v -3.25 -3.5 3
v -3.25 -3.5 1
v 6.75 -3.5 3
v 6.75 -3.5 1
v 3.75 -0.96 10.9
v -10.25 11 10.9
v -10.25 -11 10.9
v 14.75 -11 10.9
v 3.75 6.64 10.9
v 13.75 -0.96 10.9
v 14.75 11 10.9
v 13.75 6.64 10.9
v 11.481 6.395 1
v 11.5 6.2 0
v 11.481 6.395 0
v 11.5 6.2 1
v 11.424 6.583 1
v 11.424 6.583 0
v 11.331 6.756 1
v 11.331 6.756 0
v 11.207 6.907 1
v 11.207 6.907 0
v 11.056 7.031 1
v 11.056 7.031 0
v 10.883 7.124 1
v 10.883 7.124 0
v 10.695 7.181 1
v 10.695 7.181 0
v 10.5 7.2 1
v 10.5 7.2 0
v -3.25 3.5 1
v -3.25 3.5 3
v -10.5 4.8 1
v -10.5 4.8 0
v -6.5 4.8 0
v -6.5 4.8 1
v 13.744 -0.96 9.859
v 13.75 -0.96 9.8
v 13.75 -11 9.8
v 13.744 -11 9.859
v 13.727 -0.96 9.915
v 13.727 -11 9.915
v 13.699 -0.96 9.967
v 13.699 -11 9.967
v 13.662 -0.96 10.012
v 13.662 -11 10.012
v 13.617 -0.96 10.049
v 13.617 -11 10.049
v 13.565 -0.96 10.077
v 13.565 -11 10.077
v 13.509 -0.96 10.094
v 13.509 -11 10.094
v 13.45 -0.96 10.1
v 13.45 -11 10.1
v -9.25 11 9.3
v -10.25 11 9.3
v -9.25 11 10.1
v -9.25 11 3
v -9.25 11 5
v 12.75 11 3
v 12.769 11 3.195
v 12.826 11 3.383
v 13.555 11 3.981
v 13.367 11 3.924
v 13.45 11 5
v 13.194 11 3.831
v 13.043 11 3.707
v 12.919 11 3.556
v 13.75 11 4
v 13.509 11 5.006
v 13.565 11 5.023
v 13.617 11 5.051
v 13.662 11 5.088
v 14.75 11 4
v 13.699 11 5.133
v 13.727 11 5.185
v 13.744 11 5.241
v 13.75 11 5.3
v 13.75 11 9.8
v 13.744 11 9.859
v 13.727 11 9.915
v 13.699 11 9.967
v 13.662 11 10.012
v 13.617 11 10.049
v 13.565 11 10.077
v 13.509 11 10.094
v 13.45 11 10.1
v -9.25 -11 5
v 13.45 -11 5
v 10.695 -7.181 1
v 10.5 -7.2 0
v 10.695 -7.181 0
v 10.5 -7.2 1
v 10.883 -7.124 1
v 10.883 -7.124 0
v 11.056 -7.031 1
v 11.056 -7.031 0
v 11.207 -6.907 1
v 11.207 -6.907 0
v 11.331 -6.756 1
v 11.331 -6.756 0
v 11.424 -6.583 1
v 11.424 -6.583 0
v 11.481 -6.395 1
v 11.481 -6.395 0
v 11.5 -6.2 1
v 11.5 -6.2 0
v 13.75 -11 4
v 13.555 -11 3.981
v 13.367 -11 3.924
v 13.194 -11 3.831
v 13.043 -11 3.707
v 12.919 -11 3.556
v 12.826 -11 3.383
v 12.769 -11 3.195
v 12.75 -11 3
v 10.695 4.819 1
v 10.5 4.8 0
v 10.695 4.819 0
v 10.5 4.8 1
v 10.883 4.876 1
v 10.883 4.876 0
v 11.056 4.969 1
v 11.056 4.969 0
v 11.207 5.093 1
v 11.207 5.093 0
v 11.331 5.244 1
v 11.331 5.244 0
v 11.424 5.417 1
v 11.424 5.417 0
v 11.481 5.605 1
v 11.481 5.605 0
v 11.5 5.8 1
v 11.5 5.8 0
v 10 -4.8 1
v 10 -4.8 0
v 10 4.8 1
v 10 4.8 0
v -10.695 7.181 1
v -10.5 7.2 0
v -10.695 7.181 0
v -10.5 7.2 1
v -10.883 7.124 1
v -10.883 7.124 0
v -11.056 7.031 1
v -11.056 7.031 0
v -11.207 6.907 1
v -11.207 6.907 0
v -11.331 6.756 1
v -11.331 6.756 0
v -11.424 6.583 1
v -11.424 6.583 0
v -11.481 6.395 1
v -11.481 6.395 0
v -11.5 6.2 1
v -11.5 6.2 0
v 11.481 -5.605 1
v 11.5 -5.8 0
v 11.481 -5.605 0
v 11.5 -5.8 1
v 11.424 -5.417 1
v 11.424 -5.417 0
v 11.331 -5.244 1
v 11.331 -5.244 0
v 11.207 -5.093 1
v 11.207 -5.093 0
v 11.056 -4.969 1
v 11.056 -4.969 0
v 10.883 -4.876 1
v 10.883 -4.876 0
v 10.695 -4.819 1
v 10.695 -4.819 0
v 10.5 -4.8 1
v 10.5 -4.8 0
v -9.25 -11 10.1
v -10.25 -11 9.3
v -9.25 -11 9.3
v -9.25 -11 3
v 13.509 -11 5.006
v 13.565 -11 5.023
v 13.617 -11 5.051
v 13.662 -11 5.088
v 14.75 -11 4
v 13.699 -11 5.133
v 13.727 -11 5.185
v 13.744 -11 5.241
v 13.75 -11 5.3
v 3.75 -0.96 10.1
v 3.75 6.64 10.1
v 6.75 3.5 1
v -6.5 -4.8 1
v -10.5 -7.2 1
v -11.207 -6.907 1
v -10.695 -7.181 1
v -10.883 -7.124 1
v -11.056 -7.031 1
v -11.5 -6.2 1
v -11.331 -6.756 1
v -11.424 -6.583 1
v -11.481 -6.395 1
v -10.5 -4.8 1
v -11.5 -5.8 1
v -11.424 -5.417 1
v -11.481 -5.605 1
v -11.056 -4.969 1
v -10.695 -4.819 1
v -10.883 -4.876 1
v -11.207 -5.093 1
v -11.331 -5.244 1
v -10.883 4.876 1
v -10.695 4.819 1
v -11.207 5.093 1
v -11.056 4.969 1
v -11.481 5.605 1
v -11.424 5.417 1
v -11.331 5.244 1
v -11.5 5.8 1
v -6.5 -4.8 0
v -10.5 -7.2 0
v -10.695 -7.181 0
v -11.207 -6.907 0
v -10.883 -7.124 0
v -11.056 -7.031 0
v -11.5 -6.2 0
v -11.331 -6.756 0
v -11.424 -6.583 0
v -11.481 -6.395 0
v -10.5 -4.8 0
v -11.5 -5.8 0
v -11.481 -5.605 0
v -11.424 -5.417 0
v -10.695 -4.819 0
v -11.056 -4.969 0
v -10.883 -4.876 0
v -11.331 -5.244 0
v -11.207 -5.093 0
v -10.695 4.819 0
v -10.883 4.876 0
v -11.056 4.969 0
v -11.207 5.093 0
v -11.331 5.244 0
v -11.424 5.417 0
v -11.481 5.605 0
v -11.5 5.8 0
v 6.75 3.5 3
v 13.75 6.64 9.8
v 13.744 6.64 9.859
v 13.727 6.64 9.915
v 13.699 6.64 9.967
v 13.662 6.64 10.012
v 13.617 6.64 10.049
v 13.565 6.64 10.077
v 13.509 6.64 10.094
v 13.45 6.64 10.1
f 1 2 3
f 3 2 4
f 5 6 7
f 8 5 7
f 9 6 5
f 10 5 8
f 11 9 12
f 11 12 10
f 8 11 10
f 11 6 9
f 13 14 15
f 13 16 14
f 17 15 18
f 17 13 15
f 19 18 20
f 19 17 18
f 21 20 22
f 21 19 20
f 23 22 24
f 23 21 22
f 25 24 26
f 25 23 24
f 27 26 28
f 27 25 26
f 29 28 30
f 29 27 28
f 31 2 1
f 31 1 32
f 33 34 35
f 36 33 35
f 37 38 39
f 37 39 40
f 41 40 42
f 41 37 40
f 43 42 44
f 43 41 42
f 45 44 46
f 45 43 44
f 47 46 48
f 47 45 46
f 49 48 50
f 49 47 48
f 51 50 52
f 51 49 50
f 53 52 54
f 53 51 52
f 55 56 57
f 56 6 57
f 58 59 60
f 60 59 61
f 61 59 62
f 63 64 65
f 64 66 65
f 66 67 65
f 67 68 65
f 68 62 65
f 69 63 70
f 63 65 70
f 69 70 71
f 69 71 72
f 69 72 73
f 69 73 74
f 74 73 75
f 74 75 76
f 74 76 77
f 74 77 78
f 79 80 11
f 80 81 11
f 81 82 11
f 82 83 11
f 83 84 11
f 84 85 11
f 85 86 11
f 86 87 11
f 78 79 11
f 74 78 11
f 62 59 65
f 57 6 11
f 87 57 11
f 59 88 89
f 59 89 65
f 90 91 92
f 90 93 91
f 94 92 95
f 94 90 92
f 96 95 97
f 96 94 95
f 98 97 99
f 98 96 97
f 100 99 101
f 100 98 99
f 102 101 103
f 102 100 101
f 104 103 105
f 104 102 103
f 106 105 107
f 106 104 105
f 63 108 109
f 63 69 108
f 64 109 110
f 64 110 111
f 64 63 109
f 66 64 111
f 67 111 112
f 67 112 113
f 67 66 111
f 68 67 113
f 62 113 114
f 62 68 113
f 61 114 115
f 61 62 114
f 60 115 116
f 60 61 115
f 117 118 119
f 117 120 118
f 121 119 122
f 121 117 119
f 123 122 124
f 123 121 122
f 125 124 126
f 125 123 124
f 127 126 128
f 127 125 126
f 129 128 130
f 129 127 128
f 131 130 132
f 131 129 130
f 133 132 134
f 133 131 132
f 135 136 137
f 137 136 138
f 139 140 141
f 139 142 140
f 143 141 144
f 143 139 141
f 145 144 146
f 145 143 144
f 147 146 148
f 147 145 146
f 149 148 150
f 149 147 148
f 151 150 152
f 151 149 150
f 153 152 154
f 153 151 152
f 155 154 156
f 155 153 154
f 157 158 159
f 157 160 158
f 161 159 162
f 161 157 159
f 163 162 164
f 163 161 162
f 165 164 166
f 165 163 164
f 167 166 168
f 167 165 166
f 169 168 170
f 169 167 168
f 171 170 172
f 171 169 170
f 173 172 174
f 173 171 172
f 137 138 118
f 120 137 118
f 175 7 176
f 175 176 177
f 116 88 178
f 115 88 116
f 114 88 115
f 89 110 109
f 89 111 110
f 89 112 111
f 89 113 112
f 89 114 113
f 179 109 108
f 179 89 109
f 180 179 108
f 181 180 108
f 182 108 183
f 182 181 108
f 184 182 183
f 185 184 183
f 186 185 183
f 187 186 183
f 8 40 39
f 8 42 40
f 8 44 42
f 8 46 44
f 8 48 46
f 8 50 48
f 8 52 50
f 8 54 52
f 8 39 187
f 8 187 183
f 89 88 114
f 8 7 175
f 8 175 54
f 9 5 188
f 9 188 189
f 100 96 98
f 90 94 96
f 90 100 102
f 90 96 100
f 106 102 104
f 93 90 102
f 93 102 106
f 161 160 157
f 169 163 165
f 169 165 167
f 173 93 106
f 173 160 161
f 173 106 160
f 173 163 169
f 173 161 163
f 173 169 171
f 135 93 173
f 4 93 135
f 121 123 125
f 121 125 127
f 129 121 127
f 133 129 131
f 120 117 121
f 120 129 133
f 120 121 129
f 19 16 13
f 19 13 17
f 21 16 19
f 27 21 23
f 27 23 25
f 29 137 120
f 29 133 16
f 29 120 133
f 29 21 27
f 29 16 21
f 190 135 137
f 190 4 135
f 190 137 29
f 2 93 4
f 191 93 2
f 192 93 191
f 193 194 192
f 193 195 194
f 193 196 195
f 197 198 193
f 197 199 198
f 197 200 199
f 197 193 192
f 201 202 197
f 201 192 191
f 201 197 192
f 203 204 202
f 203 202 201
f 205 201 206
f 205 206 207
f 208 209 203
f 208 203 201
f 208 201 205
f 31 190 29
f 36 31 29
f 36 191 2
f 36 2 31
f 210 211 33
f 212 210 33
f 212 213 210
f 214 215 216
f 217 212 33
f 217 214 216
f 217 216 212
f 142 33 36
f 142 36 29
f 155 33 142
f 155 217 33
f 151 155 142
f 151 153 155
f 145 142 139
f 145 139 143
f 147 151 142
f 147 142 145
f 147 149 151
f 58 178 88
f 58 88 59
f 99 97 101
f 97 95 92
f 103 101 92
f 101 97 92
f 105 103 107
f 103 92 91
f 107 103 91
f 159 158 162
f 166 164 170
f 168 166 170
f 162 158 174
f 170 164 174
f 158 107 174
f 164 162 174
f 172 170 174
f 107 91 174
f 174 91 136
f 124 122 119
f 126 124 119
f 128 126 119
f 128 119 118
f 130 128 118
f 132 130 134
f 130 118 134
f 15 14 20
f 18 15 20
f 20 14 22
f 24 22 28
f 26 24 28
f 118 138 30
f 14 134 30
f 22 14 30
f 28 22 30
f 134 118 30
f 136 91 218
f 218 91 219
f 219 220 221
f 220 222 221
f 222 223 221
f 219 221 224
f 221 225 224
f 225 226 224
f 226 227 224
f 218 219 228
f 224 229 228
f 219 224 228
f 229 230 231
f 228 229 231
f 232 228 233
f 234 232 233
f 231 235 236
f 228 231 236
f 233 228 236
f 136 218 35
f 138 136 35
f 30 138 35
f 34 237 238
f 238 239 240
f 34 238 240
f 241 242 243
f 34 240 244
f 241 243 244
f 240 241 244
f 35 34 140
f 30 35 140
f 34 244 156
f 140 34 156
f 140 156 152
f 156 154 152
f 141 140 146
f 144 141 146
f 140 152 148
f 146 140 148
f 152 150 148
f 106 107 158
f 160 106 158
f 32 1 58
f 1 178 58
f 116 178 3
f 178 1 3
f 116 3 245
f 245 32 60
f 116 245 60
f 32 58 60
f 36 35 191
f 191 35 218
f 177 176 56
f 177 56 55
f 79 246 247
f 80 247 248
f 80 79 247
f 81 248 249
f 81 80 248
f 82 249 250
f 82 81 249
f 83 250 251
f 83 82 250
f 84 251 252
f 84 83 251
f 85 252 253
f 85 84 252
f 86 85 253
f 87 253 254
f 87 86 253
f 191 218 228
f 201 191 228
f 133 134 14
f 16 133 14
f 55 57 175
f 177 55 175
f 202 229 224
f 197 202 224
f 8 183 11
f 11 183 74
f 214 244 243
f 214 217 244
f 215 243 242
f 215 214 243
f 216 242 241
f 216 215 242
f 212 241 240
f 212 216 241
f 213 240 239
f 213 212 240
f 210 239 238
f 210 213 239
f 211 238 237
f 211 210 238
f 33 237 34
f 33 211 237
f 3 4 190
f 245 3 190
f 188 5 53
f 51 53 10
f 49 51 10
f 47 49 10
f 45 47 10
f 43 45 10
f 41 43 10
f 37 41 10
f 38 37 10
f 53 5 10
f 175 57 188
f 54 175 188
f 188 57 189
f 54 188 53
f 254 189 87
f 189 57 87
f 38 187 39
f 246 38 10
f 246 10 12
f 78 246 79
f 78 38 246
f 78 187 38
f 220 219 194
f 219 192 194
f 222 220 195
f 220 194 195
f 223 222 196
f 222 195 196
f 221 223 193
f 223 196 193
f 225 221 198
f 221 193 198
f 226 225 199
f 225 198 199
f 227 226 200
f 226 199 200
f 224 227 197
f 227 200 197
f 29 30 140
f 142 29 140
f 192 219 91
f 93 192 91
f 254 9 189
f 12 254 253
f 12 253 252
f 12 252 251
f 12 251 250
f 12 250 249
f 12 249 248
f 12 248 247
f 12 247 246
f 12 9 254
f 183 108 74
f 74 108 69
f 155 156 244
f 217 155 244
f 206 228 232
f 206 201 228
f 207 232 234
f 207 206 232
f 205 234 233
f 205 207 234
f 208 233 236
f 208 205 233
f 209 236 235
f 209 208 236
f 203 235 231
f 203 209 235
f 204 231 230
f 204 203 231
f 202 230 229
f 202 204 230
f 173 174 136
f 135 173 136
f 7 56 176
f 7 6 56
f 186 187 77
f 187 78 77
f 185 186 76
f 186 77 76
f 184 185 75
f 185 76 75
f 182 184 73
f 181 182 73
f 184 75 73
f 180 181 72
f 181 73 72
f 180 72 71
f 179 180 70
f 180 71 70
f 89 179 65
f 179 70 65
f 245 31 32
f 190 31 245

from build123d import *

# Parameters (mm, degrees)
BOSS_EXTRUDE1_DEPTH = 1
FILLET2_R           = 1
SKETCH3_W           = 10
SKETCH3_H           = 7
BOSS_EXTRUDE2_DEPTH = 2
SKETCH4_W           = 22
SKETCH4_H           = 22
BOSS_EXTRUDE3_DEPTH = 2
SKETCH5_W           = 22
SKETCH5_H           = 1
BOSS_EXTRUDE4_DEPTH = 2
SKETCH6_W           = 1
SKETCH6_H           = 22
BOSS_EXTRUDE5_DEPTH = 5.1
FILLET4_R           = 1
FILLET5_R           = 0.3
SKETCH7_W           = 25
SKETCH7_H           = 22
BOSS_EXTRUDE6_DEPTH = 0.8
FILLET6_R           = 0.3
SKETCH8_W           = 10
SKETCH8_H           = 7.6
CUT_EXTRUDE1_DEPTH  = 2
SKETCH9_W           = 1
SKETCH9_H           = 22
BOSS_EXTRUDE7_DEPTH = 0.8


with BuildPart() as part:
    # Sketch2 → Boss-Extrude1 (new body)
    with BuildSketch(Plane(origin=(0, 0, 0), x_dir=(0, 1, 0), z_dir=(0, 0, 1))):
        Polygon((-7.2, 11.5), (-7.2, -11.5), (-4.8, -11.5), (-4.8, -10), (4.8, -10), (4.8, -11.5), (7.2, -11.5), (7.2, 11.5), (4.8, 11.5), (4.8, 6.5), (-4.8, 6.5), (-4.8, 11.5), align=None)
    extrude(amount=BOSS_EXTRUDE1_DEPTH)

    # Fillet2
    fillet2_edges = [part.edges().sort_by_distance(p)[0] for p in [
        (11.5, 7.2, 0.5),
        (11.5, 4.8, 0.5),
        (11.5, -4.8, 0.5),
        (11.5, -7.2, 0.5),
        (-11.5, -7.2, 0.5),
        (-11.5, -4.8, 0.5),
        (-11.5, 4.8, 0.5),
        (-11.5, 7.2, 0.5),
    ]]
    fillet(fillet2_edges, radius=FILLET2_R)

    # Sketch3 → Boss-Extrude2 (add)
    with BuildSketch(Plane.XY.offset(1)):
        with Locations((1.75, 0)):
            Rectangle(SKETCH3_W, SKETCH3_H)
    extrude(amount=BOSS_EXTRUDE2_DEPTH)

    # Sketch4 → Boss-Extrude3 (add)
    with BuildSketch(Plane.XY.offset(3)):
        with Locations((1.75, 0)):
            Rectangle(SKETCH4_W, SKETCH4_H)
    extrude(amount=BOSS_EXTRUDE3_DEPTH)

    # Sketch5 → Boss-Extrude4 (add)
    with BuildSketch(Plane.YZ.offset(12.75)):
        with Locations((0, 4.5)):
            Rectangle(SKETCH5_W, SKETCH5_H)
    extrude(amount=BOSS_EXTRUDE4_DEPTH)

    # Sketch6 → Boss-Extrude5 (add)
    with BuildSketch(Plane.XY.offset(5)):
        with Locations((14.25, 0)):
            Rectangle(SKETCH6_W, SKETCH6_H)
    extrude(amount=BOSS_EXTRUDE5_DEPTH)

    # Fillet4
    fillet4_edges = [part.edges().sort_by_distance(p)[0] for p in [
        (12.75, 0, 4),
    ]]
    fillet(fillet4_edges, radius=FILLET4_R - 0.0001)  # a hair under: the kernel refuses the full size

    # Fillet5
    fillet5_edges = [part.edges().sort_by_distance(p)[0] for p in [
        (13.75, 0, 5),
    ]]
    fillet(fillet5_edges, radius=FILLET5_R)

    # Sketch7 → Boss-Extrude6 (add)
    with BuildSketch(Plane.XY.offset(10.1)):
        with Locations((2.25, 0)):
            Rectangle(SKETCH7_W, SKETCH7_H)
    extrude(amount=BOSS_EXTRUDE6_DEPTH)

    # Fillet6
    fillet6_edges = [part.edges().sort_by_distance(p)[0] for p in [
        (13.75, 0, 10.1),
    ]]
    fillet(fillet6_edges, radius=FILLET6_R)

    # Sketch8 → Cut-Extrude1 (cut)
    with BuildSketch(Plane.XY.offset(10.9)):
        with Locations((8.75, 2.84)):
            Rectangle(SKETCH8_W, SKETCH8_H)
    extrude(amount=-CUT_EXTRUDE1_DEPTH, mode=Mode.SUBTRACT)

    # Sketch9 → Boss-Extrude7 (add)
    with BuildSketch(Plane(origin=(0, 0, 10.1), x_dir=(1, 0, 0), z_dir=(0, 0, -1))):
        with Locations((-9.75, 0)):
            Rectangle(SKETCH9_W, SKETCH9_H)
    extrude(amount=BOSS_EXTRUDE7_DEPTH)


solid = part.part
